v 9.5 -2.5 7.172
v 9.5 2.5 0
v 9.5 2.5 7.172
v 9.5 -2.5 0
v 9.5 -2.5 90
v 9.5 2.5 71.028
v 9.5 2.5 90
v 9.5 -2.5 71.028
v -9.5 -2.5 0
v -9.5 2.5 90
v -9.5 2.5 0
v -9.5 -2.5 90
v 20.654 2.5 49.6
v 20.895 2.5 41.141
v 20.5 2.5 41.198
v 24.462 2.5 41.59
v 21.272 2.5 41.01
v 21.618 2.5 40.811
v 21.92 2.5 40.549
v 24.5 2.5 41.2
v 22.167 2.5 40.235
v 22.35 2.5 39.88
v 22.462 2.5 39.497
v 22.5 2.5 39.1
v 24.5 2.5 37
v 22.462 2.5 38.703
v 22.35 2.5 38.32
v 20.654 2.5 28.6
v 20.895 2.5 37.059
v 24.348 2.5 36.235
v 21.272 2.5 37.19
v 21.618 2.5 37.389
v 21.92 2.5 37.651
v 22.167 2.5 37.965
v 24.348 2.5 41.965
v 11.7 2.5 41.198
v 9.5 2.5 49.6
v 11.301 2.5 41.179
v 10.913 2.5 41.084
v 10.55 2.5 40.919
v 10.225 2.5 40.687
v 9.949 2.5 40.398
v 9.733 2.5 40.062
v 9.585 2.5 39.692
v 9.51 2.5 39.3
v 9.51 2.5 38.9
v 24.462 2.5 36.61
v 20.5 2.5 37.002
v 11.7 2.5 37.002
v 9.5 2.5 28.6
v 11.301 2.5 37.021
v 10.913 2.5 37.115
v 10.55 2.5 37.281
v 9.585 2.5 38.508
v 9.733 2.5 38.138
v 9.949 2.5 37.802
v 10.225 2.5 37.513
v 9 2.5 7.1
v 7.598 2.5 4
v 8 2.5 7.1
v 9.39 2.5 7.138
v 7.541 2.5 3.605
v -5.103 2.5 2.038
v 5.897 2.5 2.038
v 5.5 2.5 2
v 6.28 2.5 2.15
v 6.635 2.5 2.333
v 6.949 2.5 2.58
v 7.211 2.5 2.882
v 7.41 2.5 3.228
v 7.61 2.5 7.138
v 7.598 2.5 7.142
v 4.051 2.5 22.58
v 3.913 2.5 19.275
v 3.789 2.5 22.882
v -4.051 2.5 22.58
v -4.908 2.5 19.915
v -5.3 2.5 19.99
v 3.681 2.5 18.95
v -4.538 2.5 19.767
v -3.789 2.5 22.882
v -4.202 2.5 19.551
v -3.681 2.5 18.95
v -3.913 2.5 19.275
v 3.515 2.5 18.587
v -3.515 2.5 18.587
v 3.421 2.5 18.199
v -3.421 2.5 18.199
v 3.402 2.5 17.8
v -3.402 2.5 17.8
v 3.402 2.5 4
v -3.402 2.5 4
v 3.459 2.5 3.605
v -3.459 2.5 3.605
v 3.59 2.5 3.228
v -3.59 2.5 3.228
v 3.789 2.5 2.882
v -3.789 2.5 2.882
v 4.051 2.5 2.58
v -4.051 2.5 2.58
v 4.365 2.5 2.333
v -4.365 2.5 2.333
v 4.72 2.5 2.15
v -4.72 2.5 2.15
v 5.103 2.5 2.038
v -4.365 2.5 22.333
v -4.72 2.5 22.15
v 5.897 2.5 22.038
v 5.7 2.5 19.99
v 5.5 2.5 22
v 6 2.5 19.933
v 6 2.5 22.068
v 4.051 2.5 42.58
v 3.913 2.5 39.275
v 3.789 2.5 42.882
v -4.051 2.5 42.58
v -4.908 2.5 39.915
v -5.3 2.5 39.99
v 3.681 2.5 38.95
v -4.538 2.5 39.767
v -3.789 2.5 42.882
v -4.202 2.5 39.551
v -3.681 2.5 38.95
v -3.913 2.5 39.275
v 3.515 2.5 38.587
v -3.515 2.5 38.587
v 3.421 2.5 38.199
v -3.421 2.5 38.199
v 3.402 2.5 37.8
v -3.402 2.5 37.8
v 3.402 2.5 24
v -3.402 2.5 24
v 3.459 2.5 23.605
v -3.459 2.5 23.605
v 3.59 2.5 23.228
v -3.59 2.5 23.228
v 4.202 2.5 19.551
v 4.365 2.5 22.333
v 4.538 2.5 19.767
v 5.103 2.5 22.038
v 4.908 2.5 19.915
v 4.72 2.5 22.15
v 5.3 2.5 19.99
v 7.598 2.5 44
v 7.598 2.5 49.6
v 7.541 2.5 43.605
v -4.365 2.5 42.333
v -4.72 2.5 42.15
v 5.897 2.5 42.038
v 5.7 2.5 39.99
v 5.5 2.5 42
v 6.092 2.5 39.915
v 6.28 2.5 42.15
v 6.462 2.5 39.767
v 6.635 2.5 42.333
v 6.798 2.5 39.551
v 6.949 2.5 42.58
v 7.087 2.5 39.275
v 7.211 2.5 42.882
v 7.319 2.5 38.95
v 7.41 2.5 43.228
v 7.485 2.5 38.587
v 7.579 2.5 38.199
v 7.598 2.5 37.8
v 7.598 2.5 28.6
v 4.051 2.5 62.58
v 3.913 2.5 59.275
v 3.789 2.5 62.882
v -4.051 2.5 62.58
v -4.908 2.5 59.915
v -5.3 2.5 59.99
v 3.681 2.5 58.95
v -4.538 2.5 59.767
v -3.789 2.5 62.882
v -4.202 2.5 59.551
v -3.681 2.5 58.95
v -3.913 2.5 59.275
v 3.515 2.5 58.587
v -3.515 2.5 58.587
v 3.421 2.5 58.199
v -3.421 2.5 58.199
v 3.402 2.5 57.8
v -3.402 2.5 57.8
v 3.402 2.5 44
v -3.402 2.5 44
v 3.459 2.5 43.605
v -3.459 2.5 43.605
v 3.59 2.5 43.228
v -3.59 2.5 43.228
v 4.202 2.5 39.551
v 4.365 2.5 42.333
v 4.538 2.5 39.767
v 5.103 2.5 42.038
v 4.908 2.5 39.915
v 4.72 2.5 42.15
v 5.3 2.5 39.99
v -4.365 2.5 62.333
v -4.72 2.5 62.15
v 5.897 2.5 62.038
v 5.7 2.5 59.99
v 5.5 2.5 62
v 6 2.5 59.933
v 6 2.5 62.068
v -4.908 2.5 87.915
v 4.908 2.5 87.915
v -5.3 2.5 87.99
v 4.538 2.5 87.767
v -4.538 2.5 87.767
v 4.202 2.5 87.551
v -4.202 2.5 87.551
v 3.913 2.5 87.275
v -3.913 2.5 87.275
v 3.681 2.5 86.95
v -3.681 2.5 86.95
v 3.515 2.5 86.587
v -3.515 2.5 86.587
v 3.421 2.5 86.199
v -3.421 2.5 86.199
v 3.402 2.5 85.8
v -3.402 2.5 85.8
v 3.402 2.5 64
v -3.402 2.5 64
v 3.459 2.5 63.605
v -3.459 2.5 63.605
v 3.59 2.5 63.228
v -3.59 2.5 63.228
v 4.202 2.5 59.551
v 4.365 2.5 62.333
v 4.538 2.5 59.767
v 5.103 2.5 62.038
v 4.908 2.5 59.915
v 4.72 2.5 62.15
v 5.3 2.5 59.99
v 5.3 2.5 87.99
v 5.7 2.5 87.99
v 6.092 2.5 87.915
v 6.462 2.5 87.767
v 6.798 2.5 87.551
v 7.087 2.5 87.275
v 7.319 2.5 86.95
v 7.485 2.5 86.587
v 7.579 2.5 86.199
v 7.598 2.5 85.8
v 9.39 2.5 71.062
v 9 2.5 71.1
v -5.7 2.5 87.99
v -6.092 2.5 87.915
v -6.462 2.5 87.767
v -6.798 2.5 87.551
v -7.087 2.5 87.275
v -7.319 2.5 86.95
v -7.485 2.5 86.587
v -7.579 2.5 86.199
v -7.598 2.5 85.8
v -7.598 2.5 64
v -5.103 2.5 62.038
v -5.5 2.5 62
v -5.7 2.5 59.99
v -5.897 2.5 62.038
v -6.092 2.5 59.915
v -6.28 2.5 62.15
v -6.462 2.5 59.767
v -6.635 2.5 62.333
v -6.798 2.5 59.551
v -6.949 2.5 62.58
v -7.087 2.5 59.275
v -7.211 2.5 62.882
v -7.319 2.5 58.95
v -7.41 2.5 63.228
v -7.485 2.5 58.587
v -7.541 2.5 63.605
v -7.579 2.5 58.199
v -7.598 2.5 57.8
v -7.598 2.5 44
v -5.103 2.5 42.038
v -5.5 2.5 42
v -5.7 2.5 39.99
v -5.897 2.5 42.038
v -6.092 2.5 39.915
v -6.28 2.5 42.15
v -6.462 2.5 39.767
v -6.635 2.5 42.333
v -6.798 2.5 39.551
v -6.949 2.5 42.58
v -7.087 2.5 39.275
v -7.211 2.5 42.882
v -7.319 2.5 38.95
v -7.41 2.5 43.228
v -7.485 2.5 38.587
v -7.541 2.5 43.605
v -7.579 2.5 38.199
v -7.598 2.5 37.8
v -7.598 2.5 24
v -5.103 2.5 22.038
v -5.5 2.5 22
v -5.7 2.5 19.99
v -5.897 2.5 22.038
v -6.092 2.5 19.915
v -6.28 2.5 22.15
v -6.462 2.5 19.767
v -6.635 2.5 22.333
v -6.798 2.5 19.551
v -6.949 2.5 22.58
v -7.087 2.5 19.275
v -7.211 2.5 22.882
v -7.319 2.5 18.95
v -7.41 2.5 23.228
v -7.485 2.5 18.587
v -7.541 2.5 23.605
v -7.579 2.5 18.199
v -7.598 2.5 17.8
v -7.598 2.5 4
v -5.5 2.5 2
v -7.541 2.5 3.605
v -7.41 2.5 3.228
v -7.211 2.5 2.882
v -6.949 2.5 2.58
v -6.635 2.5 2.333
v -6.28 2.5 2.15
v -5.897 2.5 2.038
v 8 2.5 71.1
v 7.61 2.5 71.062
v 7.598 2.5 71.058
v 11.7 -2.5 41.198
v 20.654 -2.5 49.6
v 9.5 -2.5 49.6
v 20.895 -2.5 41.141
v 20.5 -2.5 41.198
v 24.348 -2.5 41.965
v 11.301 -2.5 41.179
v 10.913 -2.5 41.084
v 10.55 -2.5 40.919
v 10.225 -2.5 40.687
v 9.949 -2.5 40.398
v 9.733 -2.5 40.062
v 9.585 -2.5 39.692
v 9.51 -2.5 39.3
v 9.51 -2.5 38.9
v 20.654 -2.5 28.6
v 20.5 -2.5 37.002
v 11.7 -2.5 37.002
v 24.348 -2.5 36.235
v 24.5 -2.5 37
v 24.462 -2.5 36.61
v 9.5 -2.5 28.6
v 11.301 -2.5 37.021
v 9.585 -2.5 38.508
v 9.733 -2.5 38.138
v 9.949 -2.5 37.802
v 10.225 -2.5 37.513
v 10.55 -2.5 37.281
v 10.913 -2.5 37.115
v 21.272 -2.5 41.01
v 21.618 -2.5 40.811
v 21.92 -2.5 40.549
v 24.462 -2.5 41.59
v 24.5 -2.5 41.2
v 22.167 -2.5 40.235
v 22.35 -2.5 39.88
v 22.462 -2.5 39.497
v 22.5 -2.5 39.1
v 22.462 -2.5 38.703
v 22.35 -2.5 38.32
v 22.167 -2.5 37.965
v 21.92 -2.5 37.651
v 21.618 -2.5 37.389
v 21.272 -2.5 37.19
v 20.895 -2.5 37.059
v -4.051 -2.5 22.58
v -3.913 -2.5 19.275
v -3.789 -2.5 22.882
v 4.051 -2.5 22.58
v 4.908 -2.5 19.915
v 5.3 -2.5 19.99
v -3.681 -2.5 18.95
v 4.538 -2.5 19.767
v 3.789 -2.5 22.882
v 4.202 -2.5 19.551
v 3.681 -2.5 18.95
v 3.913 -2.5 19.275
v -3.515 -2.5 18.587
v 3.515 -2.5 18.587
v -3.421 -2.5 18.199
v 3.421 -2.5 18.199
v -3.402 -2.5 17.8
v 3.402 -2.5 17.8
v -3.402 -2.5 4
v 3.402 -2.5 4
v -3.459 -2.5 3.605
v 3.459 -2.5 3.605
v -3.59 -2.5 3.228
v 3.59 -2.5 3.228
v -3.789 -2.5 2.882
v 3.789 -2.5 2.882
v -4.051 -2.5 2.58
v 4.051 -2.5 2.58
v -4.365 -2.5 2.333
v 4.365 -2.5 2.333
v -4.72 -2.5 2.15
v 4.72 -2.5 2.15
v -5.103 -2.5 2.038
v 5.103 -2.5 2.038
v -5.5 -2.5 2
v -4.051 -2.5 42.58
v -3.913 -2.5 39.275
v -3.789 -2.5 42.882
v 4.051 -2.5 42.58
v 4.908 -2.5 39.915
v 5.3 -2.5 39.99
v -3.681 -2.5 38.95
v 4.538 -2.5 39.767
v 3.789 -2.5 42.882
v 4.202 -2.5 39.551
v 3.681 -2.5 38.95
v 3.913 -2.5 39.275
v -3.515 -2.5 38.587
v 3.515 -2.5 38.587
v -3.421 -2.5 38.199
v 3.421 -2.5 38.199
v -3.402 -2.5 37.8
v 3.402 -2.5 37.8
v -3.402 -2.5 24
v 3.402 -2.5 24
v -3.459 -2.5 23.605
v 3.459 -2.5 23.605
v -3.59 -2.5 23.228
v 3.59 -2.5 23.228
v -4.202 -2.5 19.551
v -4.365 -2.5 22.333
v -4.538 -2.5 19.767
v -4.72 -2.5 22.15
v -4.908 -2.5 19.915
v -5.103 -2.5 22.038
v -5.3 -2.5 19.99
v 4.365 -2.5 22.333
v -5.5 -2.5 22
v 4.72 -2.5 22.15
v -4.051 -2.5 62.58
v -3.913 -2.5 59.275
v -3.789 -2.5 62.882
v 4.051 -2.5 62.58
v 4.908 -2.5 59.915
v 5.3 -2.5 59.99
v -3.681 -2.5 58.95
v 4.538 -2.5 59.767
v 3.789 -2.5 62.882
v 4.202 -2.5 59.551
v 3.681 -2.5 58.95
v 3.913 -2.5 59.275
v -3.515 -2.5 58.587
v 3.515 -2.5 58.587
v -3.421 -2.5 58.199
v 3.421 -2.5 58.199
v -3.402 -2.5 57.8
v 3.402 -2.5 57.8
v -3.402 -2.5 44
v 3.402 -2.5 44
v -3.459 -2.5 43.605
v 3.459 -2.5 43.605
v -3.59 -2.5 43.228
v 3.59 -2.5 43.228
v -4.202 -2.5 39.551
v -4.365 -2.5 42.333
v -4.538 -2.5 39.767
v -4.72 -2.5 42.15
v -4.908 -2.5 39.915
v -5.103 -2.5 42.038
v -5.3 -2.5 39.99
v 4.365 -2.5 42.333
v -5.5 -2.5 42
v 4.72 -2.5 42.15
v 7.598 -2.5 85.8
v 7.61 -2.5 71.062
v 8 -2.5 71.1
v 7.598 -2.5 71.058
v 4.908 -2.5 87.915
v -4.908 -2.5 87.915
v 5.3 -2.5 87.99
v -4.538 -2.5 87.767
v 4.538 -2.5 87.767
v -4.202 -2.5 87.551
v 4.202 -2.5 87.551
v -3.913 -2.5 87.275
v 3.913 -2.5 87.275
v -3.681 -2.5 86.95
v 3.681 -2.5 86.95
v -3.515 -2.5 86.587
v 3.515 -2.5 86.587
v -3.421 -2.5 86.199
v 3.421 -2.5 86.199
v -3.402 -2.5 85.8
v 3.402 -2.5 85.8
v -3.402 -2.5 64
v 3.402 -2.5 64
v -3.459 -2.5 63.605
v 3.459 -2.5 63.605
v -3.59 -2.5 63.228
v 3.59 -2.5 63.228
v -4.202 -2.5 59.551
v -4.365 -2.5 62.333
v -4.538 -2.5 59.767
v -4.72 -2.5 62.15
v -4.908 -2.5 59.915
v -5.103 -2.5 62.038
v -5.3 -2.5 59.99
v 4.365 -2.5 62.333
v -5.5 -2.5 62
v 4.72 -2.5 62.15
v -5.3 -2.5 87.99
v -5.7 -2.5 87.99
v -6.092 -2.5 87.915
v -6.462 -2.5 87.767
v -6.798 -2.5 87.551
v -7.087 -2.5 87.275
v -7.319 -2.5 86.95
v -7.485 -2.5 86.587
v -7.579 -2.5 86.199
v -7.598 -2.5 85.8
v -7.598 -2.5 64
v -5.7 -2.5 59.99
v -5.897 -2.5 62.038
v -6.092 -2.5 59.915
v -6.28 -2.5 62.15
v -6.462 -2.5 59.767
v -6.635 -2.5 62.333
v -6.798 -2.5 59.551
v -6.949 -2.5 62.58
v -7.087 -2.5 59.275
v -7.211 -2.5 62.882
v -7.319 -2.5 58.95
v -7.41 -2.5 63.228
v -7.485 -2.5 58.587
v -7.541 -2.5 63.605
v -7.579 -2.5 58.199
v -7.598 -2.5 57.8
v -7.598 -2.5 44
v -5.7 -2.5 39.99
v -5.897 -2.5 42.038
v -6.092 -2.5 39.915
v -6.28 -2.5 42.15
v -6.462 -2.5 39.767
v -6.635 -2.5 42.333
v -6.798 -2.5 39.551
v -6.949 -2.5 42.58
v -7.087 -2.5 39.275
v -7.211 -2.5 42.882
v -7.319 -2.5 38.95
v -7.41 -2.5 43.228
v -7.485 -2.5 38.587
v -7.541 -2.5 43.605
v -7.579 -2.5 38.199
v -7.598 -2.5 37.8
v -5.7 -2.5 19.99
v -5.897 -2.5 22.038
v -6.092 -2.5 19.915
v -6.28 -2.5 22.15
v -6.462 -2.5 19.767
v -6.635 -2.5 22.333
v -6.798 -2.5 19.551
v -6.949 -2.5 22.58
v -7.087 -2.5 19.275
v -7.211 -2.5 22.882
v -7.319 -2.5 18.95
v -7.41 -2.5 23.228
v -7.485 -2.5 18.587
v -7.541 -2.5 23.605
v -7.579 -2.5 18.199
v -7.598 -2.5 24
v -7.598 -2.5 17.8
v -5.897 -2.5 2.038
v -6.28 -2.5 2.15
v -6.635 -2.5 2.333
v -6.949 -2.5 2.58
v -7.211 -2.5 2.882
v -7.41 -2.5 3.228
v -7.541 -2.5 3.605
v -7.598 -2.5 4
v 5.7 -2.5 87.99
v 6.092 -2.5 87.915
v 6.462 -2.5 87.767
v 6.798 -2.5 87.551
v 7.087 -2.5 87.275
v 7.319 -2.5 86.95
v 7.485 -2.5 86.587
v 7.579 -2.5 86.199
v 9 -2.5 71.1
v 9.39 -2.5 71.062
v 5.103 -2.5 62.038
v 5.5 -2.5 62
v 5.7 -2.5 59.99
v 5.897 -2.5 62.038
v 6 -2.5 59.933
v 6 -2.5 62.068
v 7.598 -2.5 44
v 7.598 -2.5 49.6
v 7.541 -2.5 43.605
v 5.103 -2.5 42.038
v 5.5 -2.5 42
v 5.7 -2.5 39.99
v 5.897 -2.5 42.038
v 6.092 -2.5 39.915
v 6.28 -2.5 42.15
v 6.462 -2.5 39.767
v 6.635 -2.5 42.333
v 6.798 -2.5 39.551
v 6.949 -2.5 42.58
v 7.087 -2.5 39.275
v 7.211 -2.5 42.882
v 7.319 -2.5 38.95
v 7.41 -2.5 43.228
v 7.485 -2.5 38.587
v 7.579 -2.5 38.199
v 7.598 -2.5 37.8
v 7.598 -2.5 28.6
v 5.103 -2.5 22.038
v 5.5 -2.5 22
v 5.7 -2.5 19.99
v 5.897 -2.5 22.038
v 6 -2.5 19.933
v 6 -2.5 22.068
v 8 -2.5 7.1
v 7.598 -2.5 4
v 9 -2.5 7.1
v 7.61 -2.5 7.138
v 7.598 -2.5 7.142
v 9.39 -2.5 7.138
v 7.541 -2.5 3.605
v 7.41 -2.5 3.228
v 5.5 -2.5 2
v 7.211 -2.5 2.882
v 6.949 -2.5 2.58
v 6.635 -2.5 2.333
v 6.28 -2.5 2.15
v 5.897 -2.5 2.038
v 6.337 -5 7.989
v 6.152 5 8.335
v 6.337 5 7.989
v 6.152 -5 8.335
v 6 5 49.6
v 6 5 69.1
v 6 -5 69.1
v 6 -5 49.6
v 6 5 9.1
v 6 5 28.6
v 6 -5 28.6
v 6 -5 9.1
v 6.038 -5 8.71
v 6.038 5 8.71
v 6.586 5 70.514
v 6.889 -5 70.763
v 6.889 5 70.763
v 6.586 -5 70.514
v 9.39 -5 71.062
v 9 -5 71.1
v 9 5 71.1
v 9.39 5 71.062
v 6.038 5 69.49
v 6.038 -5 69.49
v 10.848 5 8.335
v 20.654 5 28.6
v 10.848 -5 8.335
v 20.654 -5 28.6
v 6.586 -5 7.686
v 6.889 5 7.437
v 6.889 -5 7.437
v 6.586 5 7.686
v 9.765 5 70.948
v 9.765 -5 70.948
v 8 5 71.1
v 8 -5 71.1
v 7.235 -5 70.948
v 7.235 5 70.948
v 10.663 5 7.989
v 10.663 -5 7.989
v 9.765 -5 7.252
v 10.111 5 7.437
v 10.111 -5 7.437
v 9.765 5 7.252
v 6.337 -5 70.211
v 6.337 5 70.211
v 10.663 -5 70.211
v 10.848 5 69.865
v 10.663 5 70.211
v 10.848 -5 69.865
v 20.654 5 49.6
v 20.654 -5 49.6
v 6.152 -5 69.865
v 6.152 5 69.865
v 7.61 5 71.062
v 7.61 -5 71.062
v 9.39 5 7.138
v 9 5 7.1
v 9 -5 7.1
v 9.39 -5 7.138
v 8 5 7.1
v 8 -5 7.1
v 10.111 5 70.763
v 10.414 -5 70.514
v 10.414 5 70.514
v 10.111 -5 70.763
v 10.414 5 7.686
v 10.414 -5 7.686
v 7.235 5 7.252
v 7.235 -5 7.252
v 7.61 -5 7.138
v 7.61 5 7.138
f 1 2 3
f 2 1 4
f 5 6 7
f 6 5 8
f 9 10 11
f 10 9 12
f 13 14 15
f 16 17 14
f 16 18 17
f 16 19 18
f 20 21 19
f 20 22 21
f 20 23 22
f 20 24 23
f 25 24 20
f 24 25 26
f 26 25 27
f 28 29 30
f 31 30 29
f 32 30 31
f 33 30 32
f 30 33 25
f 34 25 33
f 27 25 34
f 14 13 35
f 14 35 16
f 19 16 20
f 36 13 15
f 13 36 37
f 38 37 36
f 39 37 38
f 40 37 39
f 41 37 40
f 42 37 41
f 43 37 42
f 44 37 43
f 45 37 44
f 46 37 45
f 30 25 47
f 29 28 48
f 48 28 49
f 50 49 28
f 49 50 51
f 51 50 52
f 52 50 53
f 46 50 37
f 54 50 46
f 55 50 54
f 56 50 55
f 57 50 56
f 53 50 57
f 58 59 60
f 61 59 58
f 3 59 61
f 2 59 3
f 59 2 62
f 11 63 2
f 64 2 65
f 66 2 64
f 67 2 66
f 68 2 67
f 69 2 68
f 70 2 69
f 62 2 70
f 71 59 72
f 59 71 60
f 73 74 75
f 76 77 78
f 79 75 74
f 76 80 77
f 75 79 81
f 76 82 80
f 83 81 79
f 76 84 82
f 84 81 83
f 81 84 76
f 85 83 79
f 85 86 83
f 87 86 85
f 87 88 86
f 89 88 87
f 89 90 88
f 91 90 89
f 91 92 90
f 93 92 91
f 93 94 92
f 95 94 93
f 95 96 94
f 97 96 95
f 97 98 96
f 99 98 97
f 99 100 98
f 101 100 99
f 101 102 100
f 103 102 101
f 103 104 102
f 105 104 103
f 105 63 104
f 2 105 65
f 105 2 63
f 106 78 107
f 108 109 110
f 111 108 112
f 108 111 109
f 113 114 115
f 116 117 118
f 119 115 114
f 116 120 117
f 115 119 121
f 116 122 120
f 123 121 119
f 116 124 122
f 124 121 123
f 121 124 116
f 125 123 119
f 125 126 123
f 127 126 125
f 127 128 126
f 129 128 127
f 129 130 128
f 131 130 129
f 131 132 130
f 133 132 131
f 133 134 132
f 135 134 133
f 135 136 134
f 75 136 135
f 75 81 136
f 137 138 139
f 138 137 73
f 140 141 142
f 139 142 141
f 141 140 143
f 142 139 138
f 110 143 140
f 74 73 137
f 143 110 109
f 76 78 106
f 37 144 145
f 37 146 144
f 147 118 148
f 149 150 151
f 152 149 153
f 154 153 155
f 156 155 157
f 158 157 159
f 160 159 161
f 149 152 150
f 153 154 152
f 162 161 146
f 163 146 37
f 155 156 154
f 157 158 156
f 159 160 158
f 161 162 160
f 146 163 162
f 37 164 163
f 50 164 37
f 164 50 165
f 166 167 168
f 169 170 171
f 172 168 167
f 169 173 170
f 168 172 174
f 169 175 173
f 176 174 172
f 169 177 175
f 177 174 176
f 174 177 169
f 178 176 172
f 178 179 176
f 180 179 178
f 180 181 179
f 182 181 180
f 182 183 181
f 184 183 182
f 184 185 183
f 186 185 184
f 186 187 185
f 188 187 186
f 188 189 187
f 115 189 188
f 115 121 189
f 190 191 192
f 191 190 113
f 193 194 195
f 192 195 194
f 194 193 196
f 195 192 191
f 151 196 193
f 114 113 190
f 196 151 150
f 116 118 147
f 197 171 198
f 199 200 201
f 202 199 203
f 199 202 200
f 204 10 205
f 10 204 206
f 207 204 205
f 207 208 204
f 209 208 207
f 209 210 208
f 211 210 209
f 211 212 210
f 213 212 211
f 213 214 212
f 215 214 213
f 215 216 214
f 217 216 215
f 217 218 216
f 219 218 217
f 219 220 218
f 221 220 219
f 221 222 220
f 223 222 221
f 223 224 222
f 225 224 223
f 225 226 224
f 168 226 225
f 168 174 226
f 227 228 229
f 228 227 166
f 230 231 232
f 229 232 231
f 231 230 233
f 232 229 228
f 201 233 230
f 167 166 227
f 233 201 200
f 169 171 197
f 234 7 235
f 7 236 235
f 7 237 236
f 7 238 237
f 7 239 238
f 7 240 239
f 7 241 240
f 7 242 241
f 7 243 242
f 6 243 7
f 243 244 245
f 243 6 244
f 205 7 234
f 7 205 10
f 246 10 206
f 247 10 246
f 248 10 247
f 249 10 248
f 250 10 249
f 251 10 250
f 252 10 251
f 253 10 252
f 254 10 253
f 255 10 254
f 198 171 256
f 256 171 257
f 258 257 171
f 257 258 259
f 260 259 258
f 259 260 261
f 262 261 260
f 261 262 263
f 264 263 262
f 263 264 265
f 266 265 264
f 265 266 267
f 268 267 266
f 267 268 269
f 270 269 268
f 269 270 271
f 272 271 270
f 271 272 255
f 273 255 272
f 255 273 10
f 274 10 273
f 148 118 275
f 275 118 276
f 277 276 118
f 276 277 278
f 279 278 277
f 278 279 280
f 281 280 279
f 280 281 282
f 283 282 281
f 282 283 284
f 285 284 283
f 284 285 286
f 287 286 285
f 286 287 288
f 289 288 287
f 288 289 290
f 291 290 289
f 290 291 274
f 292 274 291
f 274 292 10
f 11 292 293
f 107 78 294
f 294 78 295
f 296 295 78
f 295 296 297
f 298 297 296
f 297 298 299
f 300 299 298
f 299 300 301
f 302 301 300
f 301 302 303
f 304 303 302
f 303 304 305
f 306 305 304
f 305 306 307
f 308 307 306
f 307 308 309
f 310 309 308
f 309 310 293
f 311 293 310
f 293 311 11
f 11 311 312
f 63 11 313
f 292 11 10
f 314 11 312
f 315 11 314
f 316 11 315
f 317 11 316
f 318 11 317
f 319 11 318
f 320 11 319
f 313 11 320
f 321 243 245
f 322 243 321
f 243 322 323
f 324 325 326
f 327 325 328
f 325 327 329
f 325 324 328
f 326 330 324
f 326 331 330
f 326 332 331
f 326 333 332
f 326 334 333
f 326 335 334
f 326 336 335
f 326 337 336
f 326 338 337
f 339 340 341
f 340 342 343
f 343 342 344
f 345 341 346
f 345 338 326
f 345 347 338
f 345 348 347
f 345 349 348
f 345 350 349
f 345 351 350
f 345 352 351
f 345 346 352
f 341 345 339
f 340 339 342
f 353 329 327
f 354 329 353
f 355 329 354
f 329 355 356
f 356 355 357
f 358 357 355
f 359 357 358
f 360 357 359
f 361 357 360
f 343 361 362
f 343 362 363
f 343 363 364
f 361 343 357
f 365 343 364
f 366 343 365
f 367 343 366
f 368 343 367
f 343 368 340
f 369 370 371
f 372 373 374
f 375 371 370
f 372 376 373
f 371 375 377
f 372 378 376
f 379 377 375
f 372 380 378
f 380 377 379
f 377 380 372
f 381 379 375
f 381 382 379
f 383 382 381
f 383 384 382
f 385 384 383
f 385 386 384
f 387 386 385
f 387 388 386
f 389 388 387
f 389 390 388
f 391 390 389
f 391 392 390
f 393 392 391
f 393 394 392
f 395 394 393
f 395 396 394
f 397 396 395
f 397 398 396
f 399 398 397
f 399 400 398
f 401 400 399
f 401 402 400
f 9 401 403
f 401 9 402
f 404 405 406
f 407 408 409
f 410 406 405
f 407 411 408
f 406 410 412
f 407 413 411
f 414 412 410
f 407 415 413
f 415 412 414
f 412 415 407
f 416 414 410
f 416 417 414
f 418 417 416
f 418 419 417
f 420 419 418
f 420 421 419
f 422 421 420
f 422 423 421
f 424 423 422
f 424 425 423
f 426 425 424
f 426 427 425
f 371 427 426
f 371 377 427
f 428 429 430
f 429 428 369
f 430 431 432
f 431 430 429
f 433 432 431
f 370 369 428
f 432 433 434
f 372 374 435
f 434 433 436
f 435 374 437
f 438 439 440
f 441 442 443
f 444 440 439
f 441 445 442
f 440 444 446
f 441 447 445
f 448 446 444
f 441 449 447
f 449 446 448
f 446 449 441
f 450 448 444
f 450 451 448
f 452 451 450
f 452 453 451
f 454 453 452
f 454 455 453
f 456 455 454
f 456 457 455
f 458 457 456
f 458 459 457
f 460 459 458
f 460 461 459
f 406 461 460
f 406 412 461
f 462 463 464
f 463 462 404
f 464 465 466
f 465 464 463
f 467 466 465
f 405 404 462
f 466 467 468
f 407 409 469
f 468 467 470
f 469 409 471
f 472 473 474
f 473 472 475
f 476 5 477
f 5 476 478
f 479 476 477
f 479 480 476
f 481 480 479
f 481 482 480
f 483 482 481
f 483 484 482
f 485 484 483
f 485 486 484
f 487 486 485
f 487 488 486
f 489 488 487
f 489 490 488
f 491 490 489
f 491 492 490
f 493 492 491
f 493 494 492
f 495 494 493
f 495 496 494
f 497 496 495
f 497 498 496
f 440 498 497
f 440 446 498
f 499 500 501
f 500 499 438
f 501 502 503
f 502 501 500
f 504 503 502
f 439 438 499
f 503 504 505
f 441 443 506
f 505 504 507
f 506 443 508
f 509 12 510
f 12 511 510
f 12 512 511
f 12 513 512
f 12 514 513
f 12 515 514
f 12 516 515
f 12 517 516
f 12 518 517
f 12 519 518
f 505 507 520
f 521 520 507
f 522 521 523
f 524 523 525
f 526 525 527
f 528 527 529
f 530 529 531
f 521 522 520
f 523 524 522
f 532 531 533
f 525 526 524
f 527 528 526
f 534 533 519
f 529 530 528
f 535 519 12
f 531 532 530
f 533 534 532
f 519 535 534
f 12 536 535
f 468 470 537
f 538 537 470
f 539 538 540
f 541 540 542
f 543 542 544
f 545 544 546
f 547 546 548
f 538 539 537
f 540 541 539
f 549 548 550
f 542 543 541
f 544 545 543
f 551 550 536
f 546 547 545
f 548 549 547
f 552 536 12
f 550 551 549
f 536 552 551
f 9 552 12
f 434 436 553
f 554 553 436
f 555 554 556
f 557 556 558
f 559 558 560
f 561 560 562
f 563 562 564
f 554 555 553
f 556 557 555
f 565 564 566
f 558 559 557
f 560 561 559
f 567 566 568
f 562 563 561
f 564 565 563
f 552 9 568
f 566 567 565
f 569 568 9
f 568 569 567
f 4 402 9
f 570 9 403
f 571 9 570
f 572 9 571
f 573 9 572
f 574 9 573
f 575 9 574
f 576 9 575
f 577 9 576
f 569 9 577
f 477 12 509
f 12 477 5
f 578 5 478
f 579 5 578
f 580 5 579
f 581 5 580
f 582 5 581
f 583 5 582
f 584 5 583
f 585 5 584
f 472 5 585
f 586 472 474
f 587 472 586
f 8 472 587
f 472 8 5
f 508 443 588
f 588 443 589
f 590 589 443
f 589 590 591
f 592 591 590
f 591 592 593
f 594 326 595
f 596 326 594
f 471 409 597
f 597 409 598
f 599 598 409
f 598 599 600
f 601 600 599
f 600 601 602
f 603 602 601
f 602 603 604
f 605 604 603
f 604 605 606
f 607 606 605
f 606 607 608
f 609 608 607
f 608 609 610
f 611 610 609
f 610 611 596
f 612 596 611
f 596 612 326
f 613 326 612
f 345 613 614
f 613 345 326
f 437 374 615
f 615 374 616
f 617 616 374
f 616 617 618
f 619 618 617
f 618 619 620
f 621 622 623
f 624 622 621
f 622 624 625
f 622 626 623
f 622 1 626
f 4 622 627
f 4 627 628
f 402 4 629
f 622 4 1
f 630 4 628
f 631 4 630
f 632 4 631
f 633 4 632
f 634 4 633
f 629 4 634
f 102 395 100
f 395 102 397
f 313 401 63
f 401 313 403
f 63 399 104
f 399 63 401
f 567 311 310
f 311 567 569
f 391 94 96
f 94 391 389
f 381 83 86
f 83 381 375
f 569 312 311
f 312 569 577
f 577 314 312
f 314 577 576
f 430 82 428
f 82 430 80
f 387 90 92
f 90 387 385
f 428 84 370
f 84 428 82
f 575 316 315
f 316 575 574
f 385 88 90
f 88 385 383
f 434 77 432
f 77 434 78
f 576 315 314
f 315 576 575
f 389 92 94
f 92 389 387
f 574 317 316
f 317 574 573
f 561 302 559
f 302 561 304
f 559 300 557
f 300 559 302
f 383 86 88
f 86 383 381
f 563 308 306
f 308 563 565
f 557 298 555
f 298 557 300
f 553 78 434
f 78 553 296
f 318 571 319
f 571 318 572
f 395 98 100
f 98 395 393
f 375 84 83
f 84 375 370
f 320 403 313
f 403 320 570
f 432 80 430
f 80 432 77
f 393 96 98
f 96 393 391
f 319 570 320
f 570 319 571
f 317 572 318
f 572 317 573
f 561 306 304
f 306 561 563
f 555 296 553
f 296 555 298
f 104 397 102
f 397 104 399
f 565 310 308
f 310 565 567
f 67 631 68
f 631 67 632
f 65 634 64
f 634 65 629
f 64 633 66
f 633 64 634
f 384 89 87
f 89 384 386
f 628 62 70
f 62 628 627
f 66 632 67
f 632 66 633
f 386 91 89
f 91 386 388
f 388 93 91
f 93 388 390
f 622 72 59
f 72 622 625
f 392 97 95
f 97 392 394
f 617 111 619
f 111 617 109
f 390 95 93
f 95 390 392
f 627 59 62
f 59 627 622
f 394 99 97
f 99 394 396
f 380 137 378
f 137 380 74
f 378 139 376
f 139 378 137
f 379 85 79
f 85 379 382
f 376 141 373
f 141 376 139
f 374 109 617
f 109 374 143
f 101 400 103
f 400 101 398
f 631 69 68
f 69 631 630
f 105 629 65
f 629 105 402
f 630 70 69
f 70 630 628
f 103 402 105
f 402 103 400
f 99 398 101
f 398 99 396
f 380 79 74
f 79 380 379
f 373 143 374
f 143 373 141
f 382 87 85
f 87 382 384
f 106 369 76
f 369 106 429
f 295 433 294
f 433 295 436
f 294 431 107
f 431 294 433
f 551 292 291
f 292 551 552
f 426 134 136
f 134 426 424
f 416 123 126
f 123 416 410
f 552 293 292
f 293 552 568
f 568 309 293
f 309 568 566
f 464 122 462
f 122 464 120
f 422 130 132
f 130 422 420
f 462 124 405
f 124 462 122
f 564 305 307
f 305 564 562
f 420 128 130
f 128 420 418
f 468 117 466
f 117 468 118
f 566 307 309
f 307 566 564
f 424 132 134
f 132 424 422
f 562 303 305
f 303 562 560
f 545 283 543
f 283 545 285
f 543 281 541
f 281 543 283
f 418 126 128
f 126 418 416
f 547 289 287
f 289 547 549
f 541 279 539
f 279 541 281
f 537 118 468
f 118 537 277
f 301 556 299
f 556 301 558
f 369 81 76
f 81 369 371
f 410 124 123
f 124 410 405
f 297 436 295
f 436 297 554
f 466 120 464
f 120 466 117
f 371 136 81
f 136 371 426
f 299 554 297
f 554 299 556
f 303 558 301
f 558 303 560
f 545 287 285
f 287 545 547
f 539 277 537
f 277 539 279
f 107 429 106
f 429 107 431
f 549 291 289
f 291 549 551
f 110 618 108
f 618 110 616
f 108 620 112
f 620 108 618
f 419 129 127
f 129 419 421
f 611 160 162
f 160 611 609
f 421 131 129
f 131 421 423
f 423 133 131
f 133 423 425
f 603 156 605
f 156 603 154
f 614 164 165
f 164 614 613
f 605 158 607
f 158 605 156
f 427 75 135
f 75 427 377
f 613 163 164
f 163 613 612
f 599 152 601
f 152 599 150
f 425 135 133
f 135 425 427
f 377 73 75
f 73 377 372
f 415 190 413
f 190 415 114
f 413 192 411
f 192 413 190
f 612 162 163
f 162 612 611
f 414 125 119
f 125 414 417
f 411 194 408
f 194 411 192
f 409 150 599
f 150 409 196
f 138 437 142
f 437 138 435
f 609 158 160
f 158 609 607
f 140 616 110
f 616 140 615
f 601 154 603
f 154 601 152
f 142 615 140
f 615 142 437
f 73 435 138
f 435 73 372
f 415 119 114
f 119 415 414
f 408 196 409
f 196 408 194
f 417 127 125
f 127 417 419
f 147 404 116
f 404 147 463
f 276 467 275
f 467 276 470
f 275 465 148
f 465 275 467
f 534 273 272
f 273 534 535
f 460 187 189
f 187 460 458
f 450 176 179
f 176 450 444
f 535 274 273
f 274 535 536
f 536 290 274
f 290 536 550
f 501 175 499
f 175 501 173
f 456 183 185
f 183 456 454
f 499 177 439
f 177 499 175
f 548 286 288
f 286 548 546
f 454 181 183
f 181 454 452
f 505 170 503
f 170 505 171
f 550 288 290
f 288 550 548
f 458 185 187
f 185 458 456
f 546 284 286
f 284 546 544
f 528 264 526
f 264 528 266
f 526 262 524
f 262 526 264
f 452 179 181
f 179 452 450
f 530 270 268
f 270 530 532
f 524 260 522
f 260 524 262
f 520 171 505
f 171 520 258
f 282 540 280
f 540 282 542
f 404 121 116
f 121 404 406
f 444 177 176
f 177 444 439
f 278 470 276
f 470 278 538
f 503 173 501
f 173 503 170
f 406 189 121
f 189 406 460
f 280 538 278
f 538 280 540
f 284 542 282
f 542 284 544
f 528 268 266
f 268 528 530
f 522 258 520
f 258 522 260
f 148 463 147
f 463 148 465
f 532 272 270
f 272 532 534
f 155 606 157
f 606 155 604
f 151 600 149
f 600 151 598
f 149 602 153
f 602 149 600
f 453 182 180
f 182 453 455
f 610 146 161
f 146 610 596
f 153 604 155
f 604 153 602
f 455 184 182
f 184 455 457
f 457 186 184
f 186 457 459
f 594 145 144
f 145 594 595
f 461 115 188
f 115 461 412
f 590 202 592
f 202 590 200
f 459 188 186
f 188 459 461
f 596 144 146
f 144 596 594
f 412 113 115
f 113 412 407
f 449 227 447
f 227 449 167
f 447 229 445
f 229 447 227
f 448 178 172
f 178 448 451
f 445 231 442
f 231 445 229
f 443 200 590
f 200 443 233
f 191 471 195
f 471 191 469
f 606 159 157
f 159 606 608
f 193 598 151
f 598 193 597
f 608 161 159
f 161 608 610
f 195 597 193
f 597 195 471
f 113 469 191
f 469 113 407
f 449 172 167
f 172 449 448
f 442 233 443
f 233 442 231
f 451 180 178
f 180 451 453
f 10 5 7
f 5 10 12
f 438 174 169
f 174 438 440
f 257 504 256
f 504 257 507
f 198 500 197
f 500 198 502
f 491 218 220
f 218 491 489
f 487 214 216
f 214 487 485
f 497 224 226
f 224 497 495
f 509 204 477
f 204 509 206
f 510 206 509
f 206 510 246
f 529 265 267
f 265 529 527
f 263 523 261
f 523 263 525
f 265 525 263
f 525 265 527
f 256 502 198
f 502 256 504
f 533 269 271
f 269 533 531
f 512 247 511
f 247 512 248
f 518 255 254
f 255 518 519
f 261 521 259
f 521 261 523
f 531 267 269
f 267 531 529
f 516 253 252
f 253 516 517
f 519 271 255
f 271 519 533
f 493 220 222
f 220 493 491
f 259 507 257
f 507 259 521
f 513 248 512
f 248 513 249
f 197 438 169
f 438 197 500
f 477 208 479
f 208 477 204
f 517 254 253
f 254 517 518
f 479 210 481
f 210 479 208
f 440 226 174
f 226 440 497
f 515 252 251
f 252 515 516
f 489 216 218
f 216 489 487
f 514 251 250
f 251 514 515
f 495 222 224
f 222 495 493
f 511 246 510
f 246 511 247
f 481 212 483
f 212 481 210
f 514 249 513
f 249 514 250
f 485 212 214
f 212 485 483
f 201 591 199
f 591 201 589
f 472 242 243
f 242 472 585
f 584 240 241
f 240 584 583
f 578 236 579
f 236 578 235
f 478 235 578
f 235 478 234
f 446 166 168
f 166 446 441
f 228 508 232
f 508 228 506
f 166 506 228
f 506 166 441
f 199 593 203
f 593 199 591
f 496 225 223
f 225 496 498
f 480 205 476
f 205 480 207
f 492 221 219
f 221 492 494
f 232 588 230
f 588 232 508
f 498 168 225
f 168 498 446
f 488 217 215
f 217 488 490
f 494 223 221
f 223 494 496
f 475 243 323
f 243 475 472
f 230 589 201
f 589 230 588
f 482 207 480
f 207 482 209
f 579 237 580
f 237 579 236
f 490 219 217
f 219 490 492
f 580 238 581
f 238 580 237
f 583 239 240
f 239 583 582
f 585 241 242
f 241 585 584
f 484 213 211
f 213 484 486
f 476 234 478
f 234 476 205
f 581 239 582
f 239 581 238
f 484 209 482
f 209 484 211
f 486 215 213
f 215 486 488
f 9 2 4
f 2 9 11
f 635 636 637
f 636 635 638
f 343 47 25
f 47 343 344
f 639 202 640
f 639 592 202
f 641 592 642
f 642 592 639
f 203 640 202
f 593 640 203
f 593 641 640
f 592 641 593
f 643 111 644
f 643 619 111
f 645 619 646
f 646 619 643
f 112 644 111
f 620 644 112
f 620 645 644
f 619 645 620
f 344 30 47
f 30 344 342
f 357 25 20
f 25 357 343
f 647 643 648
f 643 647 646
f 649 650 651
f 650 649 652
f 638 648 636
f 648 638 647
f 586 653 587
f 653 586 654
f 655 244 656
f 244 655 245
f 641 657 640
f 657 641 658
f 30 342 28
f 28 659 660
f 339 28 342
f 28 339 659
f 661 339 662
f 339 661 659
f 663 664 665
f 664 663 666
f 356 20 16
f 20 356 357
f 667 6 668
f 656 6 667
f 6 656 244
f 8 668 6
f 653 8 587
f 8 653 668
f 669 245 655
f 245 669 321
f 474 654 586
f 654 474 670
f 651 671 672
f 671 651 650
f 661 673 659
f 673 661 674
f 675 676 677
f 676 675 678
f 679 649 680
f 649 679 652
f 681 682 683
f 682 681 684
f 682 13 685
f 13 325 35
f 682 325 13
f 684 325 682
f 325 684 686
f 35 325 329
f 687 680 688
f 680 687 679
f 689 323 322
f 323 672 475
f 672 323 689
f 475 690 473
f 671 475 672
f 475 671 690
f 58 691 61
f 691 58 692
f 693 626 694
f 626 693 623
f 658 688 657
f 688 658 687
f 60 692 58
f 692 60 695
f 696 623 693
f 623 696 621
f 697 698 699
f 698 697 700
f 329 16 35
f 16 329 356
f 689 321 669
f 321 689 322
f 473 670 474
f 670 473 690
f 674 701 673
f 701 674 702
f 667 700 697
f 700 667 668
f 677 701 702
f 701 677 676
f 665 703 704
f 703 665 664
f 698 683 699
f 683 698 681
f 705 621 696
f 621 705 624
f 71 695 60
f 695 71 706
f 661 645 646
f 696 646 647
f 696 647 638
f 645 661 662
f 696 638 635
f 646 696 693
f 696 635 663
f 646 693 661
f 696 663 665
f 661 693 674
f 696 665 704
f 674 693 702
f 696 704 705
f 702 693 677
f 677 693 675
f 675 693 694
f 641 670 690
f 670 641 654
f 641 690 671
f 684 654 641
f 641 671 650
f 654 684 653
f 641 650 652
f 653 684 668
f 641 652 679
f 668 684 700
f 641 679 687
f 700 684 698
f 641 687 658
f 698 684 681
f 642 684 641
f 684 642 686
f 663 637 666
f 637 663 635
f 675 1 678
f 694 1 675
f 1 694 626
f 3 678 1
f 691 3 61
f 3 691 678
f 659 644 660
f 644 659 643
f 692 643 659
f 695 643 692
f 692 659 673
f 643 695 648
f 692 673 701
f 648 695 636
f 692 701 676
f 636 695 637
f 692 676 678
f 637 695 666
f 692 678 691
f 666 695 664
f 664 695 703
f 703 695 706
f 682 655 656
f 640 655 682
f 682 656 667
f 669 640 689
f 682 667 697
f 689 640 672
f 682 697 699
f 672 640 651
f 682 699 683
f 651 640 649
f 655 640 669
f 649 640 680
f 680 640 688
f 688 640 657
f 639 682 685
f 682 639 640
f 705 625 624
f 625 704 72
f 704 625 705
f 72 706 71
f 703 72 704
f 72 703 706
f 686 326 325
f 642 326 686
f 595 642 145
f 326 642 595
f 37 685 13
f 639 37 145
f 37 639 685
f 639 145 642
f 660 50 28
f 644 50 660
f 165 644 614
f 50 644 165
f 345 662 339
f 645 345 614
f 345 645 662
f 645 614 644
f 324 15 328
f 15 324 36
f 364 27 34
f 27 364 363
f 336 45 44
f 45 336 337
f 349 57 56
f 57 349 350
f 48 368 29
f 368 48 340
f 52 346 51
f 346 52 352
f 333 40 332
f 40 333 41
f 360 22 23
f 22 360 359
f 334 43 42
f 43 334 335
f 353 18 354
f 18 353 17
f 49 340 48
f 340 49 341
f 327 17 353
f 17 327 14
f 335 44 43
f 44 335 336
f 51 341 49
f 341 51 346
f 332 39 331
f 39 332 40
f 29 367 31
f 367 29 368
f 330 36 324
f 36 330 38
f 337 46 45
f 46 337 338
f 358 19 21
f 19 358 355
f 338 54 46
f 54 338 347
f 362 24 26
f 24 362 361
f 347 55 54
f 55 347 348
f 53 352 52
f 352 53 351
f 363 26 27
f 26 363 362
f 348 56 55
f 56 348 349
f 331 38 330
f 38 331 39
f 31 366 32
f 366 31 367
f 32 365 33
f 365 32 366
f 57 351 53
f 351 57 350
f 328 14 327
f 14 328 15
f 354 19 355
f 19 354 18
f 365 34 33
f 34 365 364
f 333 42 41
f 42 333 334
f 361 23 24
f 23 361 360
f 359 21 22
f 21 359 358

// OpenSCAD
/* Begin suggested config */
total_height = 70; // total screw travel. Outer actual will be a little bigger.
depth = 5; // want to be kinda thick so it doesn't move

// If false, remainder is a small segment on top
// If true, top segment is stretched to fill space.
remainder_fill = true; 

screw_distance = 11;
screw_hole_d = 4.2;

track_length = 18;
track_spacing = 2;
frame_width = 19; // 2020 frame is 20mm wide

offshoot=true;
offshoot_track=13;
offshoot_padding = 0;
offshoot_round = 4;
offshoot_z_offset = 30+ (track_length/2) - track_spacing + (offshoot_padding/2);
offshoot_x_offset = 0;

/* end config */


$fa = 1;
$fs = 0.4;
fudge = 0.001;


panel_segment_height = (track_length + track_spacing);
// -track_spacing because we always put a block of 1 track_spacing at the bottom
normal_panel_count = floor((total_height - track_spacing) / panel_segment_height);
// panel_remainder does not have track_spacing included.
panel_remainder = (total_height - track_spacing) - (normal_panel_count * panel_segment_height) - track_spacing;
min_panel_height = (track_spacing + screw_hole_d) + 0.1;
echo("normal_panel_count", normal_panel_count);
echo("remainder", panel_remainder);
echo("min_panel_height", min_panel_height);

// If there's not enough space for an independent remainder section, we forcefully fill it.
do_remainder_fill = (panel_remainder > min_panel_height) ? remainder_fill : true;
if (do_remainder_fill != remainder_fill) {
    echo("WARNING: Not enough space, forcing remainder_fill = true");
}

/* BEGIN */




union(){
    all_panels();
    
    // !! nothing makes sense past this point !!
    if (offshoot) {
        //use_offshoot_padding = max(offshoot_padding, offshoot_round);
        use_offshoot_padding = offshoot_padding;
        go_offshoot_x = ((frame_width/2)+((offshoot_track + use_offshoot_padding)/2)) + offshoot_x_offset;
        go_offshoot_z = ((screw_hole_d + use_offshoot_padding)/2) + offshoot_z_offset;
        translate([go_offshoot_x, 0, go_offshoot_z]){
            difference() {
                minkowski() {
                    // pointy thing
                    hull(){
                        cube([offshoot_track + use_offshoot_padding, depth, screw_hole_d + use_offshoot_padding], center=true);
                        
                        translate([((offshoot_track + use_offshoot_padding)/-2)-1, 0, 0])
                            cube([1, depth, min((offshoot_z_offset*2)-(offshoot_round/2), 60)], center=true);
                    }
                    
                    // cylinder for smooth edges. Adjust diameter for more smooth;
                    translate([0, 0, 0])
                        rotate([90, 0, 0])
                        cylinder(h=depth, d=offshoot_round, center=true);
                }
                
                // cubes to slice off the extra from minkowski
                chop=(offshoot_track + use_offshoot_padding) + (offshoot_round*2);
                translate([0,(chop/2) + (depth/2), 0])
                    cube([chop, chop, chop], center=true);
                translate([0,(chop/-2) + (depth/-2), 0])
                    cube([chop, chop, chop], center=true);
                translate([((offshoot_track + use_offshoot_padding)/-2)-(chop/2)-0.5, 0, 0])
                    cube([chop, chop, chop], center=true);
                
                
                // puts the hole in it
                hull()
                    screw_holes(offshoot_track - screw_hole_d, screw_hole_d, depth, vertical=false);
            }
        }
    }
    
}

module all_panels() {
    // Align btm of all_panels to Z=0
    translate([0, 0, (panel_segment_height/2) + track_spacing])
    union() {
        for(i = [0 : (normal_panel_count - (do_remainder_fill ? 1 : 0))]) {
            translate([0, 0, (panel_segment_height*i)])
                panel();
        }
        if (do_remainder_fill) {
            btm_align = panel_remainder/2 + track_spacing/2;
            remainder_offset = btm_align + (panel_segment_height*normal_panel_count);
            // need to include track_spacing because there would be an extra spacer here
            translate([0, 0, remainder_offset])
                panel(panel_segment_height + panel_remainder);
        }
        else {
            btm_align = -((panel_segment_height/2)-(panel_remainder/2 + track_spacing/2));
            remainder_offset = btm_align + (panel_segment_height*(normal_panel_count+1));
            translate([0, 0, remainder_offset])
                panel(panel_remainder);
        }
        // little extra piece at the bottom
        translate([0, 0, (panel_segment_height/-2) + (track_spacing/-2)])
            cube([frame_width, depth, track_spacing], center=true);
    }
    
}

module panel(want_track_length = track_length) {
    
    new_track_len = want_track_length - screw_hole_d;
    // new_height should be == panel_segment_height with defaults
    new_height = want_track_length + track_spacing;
    mv_down = track_spacing/-2;
    
    difference() {
        cube([frame_width, depth, new_height], center=true);
        
        translate([screw_distance/-2, 0, mv_down])
            hull()
            screw_holes(new_track_len, screw_hole_d, depth, vertical=true);
        translate([screw_distance/2, 0, mv_down])
            hull()
            screw_holes(new_track_len, screw_hole_d, depth, vertical=true);
        
    }
}

module screw_holes(distance, diameter, wall, vertical=true) {
    //translate([0, 0, (switch_height/2) - (switch_screw_hole_d/2) - (wall/2)])
    rotate(vertical ? 90 : 0, [0, 1, 0])
    for (s = [-2:4:2]) {
        translate([distance/s, 0, 0])
        rotate([90, 0, 0])
        cylinder(wall*4, d=diameter, center=true);
    }
}

/*

wall = 3;


frame_screw_distance = 11;
frame_screw_hole_d = 4.2;
frame_width = max(17, frame_screw_hole_d + wall); // 2020 frame is 20mm wide
frame_height = frame_screw_distance + frame_screw_hole_d + wall;

switch_screw_distance = 11;
switch_screw_hole_d = 4;
switch_width = max(17, switch_screw_distance + switch_screw_hole_d + wall);
switch_height = 67; // total outside, screw guides will be smaller
switch_extra_width = wall*2; // for support
switch_screw_offset_bottom = wall;

switch_screw_guide_length = switch_height - wall - switch_screw_hole_d - switch_screw_offset_bottom;


union() {
    // frame
    translate([switch_width/2 + frame_width/2, 0, 0])
    difference() {
        cube([frame_width, wall, frame_height], center=true);
        
        screw_holes(frame_screw_distance, frame_screw_hole_d, vertical=true);
    }


    // vert
    translate([0, 0, switch_height/2 - frame_height/2])    
    difference() {
        cube([switch_width + switch_extra_width, wall, switch_height], center=true);
        
        for (v = [-1:2:1]) {
            translate([(switch_screw_distance / 2) * v, 0, switch_screw_offset_bottom/2])
            hull()
            screw_holes(switch_screw_guide_length, switch_screw_hole_d, vertical=true);
        }
    }
    
}

module screw_holes(distance, diameter, vertical=true) {
    //translate([0, 0, (switch_height/2) - (switch_screw_hole_d/2) - (wall/2)])
    rotate(vertical ? 90 : 0, [0, 1, 0])
    for (s = [-2:4:2]) {
        translate([distance/s, 0, 0])
        rotate([90, 0, 0])
        cylinder(wall*4, d=diameter, center=true);
    }
}
*/
